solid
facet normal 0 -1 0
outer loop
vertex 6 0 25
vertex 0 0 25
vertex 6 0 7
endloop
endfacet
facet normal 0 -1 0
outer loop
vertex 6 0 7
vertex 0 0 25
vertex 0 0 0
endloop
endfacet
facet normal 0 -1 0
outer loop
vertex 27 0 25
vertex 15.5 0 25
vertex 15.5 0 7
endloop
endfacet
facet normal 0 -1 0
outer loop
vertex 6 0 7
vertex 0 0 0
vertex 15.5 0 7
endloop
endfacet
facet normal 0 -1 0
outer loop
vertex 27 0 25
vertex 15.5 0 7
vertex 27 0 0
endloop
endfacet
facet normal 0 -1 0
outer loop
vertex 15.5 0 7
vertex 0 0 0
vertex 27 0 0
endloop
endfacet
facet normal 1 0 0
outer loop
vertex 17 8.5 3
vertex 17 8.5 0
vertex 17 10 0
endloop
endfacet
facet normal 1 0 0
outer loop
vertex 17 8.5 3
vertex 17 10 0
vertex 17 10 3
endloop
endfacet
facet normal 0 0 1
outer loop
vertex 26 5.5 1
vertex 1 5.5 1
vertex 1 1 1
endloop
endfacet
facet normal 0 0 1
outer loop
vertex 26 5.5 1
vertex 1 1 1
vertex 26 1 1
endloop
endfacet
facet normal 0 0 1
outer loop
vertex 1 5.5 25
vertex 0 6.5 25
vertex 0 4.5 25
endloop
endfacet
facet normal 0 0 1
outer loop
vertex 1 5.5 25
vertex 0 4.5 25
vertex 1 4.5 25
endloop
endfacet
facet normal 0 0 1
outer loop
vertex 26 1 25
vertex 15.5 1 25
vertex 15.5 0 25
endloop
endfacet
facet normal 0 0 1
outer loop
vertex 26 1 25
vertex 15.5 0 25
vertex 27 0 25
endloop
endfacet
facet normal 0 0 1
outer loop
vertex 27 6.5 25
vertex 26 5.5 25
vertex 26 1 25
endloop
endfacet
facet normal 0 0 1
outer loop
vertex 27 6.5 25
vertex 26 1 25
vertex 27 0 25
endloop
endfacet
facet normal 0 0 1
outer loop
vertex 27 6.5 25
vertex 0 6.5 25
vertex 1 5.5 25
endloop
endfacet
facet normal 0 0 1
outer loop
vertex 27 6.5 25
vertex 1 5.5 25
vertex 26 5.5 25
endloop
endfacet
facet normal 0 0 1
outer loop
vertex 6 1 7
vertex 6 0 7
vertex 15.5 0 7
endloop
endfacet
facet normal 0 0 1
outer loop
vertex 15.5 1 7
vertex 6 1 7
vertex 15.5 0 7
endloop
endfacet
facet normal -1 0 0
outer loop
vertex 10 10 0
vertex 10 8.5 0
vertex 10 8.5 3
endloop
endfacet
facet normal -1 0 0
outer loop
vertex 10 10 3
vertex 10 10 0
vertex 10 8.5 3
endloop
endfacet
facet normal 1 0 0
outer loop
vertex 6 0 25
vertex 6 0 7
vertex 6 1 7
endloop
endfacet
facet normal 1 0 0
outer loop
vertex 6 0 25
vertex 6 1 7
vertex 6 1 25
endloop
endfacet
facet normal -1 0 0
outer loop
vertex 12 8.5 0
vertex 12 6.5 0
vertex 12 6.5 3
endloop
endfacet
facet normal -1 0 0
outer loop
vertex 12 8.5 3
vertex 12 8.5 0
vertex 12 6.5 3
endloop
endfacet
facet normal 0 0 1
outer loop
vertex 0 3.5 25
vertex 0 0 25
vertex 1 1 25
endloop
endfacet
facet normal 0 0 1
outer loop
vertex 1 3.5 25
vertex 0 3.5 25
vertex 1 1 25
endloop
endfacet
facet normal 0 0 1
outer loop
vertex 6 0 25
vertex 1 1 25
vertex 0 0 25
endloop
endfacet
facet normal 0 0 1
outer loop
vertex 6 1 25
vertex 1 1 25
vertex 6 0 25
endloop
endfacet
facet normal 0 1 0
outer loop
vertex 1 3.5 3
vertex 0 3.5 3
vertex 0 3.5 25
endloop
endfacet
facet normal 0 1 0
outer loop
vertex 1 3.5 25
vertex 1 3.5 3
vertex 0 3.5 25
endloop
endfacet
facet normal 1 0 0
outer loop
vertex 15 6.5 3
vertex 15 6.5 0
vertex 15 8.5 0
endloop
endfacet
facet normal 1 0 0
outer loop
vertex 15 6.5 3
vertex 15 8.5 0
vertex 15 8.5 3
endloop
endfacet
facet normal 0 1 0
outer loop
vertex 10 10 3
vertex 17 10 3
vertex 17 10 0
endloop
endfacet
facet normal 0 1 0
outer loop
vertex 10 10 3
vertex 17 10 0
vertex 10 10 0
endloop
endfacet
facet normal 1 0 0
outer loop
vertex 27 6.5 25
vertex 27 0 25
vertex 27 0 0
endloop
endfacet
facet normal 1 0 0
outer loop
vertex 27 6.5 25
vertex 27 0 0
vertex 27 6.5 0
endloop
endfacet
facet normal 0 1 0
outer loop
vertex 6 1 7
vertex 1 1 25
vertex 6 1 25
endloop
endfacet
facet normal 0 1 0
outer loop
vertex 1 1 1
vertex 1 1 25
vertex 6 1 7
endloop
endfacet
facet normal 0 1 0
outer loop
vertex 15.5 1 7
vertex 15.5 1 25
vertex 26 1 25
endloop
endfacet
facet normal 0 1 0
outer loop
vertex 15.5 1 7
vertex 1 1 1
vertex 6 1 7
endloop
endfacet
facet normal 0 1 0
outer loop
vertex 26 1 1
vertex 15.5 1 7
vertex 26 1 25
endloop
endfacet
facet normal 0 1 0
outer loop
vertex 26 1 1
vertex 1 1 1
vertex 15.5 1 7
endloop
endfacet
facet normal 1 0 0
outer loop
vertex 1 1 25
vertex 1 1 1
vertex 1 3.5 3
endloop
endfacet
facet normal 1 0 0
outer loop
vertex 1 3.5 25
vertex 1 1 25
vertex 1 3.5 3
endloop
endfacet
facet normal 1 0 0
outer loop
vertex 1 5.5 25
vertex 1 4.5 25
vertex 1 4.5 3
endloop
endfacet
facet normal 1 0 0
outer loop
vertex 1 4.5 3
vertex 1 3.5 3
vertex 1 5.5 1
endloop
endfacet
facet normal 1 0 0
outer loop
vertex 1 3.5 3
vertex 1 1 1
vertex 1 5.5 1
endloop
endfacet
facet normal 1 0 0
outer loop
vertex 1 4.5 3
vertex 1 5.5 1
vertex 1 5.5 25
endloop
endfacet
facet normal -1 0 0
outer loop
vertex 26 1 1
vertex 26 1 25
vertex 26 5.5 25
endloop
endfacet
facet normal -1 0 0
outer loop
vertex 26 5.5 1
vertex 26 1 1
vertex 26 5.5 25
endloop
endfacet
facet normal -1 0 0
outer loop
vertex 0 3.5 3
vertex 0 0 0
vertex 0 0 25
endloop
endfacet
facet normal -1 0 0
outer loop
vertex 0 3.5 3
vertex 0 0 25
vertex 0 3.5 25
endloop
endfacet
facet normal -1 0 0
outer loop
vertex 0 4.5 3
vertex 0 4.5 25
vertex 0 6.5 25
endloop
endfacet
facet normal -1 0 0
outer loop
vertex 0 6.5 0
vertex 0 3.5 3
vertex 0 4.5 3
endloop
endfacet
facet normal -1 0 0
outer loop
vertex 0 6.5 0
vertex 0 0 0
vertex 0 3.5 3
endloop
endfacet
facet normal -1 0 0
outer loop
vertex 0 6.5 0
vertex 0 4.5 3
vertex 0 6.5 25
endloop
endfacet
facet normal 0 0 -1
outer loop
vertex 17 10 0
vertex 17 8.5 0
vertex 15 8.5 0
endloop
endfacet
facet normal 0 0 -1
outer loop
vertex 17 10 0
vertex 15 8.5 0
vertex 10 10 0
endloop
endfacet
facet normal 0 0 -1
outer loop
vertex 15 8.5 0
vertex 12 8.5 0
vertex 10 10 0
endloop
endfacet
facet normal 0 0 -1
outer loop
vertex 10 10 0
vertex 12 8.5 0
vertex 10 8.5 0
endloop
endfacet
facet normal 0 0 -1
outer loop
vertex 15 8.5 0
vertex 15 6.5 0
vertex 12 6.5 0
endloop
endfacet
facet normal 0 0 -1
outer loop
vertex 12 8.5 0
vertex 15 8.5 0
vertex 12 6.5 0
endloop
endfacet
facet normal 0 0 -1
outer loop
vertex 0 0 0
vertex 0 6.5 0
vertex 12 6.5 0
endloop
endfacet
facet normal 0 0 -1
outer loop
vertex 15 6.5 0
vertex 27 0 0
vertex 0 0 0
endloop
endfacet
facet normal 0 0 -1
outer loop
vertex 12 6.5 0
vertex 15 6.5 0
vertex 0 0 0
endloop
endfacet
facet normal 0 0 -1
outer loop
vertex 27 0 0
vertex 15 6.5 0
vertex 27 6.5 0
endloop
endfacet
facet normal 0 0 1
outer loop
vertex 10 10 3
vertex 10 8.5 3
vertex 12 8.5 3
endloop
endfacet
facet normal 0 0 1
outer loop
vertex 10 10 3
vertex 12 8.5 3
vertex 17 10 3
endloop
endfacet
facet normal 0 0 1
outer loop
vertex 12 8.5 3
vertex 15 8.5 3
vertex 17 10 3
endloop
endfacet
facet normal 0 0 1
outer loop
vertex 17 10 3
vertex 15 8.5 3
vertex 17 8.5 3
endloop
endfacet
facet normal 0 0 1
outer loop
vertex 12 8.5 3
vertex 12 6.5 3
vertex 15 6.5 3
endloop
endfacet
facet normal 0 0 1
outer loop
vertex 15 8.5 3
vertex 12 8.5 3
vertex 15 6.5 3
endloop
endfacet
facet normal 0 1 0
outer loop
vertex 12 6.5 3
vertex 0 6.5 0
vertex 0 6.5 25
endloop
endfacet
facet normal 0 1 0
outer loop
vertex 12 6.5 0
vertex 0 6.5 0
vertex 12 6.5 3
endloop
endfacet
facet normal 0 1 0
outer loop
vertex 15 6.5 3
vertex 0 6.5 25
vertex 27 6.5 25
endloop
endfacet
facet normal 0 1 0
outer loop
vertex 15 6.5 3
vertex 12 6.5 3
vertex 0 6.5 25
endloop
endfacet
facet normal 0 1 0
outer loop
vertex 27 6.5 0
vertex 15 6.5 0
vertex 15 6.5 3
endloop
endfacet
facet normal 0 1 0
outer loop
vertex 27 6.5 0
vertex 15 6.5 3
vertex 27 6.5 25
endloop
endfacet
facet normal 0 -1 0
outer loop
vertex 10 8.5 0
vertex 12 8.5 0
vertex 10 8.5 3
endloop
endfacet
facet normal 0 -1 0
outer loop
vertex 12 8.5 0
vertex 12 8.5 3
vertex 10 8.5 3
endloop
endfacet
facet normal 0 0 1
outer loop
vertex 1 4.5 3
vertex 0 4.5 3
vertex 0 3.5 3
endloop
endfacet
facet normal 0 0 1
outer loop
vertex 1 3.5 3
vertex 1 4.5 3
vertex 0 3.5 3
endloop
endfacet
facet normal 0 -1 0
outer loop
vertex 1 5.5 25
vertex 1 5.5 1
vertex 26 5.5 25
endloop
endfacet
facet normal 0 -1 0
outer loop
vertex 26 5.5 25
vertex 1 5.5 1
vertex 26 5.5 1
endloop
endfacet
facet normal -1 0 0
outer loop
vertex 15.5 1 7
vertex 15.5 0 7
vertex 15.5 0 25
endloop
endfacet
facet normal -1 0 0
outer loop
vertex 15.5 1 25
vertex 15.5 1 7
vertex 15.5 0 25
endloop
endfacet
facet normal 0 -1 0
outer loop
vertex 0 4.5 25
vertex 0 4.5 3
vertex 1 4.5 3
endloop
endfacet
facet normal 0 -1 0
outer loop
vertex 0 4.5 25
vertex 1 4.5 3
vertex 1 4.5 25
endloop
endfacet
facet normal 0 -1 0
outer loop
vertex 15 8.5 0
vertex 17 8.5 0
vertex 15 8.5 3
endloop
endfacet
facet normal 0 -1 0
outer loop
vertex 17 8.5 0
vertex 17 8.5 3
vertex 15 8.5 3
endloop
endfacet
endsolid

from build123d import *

# Parameters (mm, degrees)
F0_W      = 27
F0_H      = 6.5
F1_DEPTH  = 25
F2_T      = -1
F3_W      = 9.5
F3_H      = 18
F4_DEPTH  = 1
F5_W      = 1
F5_H      = 22
F6_DEPTH  = 1
F7_W      = 3
F7_H      = 3
F8_DEPTH  = 2
F9_W      = 2
F9_H      = 3
F9_W_2    = 3
F10_DEPTH = 1.5


with BuildPart() as f1:
    # F0 (on Top) → F1 (new body)
    with BuildSketch(Plane.XY):
        with Locations((13.5, 3.25)):
            Rectangle(F0_W, F0_H)
    extrude(amount=F1_DEPTH)

    # F2
    f2_openings = [f1.faces().sort_by_distance(p)[0] for p in [
        (13.5, 3.25, 25),
    ]]
    offset(amount=F2_T, openings=f2_openings)

    # F3 (on face) → F4 (cut, through all)
    with BuildSketch(Plane.XZ):
        with Locations((10.75, 16)):
            Rectangle(F3_W, F3_H)
    extrude(amount=-F4_DEPTH, mode=Mode.SUBTRACT)

    # F5 (on face) → F6 (cut, through all)
    with BuildSketch(Plane(origin=(0, 0, 0), x_dir=(0, -1, 0), z_dir=(-1, 0, 0))):
        with Locations((-4, 14)):
            Rectangle(F5_W, F5_H)
    extrude(amount=-F6_DEPTH, mode=Mode.SUBTRACT)

    # F7 (on face) → F8 (join)
    with BuildSketch(Plane(origin=(0, 6.5, 0), x_dir=(-1, 0, 0), z_dir=(0, 1, 0))):
        with Locations((-13.5, 1.5)):
            Rectangle(F7_W, F7_H)
    extrude(amount=F8_DEPTH)

    # F9 (on face) → F10 (join)
    with BuildSketch(Plane(origin=(0, 8.5, 0), x_dir=(-1, 0, 0), z_dir=(0, 1, 0))):
        with Locations((-11, 1.5)):
            Rectangle(F9_W, F9_H)
        with Locations((-13.5, 1.5)):
            Rectangle(F9_W_2, F9_H)
        with Locations((-16, 1.5)):
            Rectangle(F9_W, F9_H)
    extrude(amount=F10_DEPTH)


solid = f1.part
